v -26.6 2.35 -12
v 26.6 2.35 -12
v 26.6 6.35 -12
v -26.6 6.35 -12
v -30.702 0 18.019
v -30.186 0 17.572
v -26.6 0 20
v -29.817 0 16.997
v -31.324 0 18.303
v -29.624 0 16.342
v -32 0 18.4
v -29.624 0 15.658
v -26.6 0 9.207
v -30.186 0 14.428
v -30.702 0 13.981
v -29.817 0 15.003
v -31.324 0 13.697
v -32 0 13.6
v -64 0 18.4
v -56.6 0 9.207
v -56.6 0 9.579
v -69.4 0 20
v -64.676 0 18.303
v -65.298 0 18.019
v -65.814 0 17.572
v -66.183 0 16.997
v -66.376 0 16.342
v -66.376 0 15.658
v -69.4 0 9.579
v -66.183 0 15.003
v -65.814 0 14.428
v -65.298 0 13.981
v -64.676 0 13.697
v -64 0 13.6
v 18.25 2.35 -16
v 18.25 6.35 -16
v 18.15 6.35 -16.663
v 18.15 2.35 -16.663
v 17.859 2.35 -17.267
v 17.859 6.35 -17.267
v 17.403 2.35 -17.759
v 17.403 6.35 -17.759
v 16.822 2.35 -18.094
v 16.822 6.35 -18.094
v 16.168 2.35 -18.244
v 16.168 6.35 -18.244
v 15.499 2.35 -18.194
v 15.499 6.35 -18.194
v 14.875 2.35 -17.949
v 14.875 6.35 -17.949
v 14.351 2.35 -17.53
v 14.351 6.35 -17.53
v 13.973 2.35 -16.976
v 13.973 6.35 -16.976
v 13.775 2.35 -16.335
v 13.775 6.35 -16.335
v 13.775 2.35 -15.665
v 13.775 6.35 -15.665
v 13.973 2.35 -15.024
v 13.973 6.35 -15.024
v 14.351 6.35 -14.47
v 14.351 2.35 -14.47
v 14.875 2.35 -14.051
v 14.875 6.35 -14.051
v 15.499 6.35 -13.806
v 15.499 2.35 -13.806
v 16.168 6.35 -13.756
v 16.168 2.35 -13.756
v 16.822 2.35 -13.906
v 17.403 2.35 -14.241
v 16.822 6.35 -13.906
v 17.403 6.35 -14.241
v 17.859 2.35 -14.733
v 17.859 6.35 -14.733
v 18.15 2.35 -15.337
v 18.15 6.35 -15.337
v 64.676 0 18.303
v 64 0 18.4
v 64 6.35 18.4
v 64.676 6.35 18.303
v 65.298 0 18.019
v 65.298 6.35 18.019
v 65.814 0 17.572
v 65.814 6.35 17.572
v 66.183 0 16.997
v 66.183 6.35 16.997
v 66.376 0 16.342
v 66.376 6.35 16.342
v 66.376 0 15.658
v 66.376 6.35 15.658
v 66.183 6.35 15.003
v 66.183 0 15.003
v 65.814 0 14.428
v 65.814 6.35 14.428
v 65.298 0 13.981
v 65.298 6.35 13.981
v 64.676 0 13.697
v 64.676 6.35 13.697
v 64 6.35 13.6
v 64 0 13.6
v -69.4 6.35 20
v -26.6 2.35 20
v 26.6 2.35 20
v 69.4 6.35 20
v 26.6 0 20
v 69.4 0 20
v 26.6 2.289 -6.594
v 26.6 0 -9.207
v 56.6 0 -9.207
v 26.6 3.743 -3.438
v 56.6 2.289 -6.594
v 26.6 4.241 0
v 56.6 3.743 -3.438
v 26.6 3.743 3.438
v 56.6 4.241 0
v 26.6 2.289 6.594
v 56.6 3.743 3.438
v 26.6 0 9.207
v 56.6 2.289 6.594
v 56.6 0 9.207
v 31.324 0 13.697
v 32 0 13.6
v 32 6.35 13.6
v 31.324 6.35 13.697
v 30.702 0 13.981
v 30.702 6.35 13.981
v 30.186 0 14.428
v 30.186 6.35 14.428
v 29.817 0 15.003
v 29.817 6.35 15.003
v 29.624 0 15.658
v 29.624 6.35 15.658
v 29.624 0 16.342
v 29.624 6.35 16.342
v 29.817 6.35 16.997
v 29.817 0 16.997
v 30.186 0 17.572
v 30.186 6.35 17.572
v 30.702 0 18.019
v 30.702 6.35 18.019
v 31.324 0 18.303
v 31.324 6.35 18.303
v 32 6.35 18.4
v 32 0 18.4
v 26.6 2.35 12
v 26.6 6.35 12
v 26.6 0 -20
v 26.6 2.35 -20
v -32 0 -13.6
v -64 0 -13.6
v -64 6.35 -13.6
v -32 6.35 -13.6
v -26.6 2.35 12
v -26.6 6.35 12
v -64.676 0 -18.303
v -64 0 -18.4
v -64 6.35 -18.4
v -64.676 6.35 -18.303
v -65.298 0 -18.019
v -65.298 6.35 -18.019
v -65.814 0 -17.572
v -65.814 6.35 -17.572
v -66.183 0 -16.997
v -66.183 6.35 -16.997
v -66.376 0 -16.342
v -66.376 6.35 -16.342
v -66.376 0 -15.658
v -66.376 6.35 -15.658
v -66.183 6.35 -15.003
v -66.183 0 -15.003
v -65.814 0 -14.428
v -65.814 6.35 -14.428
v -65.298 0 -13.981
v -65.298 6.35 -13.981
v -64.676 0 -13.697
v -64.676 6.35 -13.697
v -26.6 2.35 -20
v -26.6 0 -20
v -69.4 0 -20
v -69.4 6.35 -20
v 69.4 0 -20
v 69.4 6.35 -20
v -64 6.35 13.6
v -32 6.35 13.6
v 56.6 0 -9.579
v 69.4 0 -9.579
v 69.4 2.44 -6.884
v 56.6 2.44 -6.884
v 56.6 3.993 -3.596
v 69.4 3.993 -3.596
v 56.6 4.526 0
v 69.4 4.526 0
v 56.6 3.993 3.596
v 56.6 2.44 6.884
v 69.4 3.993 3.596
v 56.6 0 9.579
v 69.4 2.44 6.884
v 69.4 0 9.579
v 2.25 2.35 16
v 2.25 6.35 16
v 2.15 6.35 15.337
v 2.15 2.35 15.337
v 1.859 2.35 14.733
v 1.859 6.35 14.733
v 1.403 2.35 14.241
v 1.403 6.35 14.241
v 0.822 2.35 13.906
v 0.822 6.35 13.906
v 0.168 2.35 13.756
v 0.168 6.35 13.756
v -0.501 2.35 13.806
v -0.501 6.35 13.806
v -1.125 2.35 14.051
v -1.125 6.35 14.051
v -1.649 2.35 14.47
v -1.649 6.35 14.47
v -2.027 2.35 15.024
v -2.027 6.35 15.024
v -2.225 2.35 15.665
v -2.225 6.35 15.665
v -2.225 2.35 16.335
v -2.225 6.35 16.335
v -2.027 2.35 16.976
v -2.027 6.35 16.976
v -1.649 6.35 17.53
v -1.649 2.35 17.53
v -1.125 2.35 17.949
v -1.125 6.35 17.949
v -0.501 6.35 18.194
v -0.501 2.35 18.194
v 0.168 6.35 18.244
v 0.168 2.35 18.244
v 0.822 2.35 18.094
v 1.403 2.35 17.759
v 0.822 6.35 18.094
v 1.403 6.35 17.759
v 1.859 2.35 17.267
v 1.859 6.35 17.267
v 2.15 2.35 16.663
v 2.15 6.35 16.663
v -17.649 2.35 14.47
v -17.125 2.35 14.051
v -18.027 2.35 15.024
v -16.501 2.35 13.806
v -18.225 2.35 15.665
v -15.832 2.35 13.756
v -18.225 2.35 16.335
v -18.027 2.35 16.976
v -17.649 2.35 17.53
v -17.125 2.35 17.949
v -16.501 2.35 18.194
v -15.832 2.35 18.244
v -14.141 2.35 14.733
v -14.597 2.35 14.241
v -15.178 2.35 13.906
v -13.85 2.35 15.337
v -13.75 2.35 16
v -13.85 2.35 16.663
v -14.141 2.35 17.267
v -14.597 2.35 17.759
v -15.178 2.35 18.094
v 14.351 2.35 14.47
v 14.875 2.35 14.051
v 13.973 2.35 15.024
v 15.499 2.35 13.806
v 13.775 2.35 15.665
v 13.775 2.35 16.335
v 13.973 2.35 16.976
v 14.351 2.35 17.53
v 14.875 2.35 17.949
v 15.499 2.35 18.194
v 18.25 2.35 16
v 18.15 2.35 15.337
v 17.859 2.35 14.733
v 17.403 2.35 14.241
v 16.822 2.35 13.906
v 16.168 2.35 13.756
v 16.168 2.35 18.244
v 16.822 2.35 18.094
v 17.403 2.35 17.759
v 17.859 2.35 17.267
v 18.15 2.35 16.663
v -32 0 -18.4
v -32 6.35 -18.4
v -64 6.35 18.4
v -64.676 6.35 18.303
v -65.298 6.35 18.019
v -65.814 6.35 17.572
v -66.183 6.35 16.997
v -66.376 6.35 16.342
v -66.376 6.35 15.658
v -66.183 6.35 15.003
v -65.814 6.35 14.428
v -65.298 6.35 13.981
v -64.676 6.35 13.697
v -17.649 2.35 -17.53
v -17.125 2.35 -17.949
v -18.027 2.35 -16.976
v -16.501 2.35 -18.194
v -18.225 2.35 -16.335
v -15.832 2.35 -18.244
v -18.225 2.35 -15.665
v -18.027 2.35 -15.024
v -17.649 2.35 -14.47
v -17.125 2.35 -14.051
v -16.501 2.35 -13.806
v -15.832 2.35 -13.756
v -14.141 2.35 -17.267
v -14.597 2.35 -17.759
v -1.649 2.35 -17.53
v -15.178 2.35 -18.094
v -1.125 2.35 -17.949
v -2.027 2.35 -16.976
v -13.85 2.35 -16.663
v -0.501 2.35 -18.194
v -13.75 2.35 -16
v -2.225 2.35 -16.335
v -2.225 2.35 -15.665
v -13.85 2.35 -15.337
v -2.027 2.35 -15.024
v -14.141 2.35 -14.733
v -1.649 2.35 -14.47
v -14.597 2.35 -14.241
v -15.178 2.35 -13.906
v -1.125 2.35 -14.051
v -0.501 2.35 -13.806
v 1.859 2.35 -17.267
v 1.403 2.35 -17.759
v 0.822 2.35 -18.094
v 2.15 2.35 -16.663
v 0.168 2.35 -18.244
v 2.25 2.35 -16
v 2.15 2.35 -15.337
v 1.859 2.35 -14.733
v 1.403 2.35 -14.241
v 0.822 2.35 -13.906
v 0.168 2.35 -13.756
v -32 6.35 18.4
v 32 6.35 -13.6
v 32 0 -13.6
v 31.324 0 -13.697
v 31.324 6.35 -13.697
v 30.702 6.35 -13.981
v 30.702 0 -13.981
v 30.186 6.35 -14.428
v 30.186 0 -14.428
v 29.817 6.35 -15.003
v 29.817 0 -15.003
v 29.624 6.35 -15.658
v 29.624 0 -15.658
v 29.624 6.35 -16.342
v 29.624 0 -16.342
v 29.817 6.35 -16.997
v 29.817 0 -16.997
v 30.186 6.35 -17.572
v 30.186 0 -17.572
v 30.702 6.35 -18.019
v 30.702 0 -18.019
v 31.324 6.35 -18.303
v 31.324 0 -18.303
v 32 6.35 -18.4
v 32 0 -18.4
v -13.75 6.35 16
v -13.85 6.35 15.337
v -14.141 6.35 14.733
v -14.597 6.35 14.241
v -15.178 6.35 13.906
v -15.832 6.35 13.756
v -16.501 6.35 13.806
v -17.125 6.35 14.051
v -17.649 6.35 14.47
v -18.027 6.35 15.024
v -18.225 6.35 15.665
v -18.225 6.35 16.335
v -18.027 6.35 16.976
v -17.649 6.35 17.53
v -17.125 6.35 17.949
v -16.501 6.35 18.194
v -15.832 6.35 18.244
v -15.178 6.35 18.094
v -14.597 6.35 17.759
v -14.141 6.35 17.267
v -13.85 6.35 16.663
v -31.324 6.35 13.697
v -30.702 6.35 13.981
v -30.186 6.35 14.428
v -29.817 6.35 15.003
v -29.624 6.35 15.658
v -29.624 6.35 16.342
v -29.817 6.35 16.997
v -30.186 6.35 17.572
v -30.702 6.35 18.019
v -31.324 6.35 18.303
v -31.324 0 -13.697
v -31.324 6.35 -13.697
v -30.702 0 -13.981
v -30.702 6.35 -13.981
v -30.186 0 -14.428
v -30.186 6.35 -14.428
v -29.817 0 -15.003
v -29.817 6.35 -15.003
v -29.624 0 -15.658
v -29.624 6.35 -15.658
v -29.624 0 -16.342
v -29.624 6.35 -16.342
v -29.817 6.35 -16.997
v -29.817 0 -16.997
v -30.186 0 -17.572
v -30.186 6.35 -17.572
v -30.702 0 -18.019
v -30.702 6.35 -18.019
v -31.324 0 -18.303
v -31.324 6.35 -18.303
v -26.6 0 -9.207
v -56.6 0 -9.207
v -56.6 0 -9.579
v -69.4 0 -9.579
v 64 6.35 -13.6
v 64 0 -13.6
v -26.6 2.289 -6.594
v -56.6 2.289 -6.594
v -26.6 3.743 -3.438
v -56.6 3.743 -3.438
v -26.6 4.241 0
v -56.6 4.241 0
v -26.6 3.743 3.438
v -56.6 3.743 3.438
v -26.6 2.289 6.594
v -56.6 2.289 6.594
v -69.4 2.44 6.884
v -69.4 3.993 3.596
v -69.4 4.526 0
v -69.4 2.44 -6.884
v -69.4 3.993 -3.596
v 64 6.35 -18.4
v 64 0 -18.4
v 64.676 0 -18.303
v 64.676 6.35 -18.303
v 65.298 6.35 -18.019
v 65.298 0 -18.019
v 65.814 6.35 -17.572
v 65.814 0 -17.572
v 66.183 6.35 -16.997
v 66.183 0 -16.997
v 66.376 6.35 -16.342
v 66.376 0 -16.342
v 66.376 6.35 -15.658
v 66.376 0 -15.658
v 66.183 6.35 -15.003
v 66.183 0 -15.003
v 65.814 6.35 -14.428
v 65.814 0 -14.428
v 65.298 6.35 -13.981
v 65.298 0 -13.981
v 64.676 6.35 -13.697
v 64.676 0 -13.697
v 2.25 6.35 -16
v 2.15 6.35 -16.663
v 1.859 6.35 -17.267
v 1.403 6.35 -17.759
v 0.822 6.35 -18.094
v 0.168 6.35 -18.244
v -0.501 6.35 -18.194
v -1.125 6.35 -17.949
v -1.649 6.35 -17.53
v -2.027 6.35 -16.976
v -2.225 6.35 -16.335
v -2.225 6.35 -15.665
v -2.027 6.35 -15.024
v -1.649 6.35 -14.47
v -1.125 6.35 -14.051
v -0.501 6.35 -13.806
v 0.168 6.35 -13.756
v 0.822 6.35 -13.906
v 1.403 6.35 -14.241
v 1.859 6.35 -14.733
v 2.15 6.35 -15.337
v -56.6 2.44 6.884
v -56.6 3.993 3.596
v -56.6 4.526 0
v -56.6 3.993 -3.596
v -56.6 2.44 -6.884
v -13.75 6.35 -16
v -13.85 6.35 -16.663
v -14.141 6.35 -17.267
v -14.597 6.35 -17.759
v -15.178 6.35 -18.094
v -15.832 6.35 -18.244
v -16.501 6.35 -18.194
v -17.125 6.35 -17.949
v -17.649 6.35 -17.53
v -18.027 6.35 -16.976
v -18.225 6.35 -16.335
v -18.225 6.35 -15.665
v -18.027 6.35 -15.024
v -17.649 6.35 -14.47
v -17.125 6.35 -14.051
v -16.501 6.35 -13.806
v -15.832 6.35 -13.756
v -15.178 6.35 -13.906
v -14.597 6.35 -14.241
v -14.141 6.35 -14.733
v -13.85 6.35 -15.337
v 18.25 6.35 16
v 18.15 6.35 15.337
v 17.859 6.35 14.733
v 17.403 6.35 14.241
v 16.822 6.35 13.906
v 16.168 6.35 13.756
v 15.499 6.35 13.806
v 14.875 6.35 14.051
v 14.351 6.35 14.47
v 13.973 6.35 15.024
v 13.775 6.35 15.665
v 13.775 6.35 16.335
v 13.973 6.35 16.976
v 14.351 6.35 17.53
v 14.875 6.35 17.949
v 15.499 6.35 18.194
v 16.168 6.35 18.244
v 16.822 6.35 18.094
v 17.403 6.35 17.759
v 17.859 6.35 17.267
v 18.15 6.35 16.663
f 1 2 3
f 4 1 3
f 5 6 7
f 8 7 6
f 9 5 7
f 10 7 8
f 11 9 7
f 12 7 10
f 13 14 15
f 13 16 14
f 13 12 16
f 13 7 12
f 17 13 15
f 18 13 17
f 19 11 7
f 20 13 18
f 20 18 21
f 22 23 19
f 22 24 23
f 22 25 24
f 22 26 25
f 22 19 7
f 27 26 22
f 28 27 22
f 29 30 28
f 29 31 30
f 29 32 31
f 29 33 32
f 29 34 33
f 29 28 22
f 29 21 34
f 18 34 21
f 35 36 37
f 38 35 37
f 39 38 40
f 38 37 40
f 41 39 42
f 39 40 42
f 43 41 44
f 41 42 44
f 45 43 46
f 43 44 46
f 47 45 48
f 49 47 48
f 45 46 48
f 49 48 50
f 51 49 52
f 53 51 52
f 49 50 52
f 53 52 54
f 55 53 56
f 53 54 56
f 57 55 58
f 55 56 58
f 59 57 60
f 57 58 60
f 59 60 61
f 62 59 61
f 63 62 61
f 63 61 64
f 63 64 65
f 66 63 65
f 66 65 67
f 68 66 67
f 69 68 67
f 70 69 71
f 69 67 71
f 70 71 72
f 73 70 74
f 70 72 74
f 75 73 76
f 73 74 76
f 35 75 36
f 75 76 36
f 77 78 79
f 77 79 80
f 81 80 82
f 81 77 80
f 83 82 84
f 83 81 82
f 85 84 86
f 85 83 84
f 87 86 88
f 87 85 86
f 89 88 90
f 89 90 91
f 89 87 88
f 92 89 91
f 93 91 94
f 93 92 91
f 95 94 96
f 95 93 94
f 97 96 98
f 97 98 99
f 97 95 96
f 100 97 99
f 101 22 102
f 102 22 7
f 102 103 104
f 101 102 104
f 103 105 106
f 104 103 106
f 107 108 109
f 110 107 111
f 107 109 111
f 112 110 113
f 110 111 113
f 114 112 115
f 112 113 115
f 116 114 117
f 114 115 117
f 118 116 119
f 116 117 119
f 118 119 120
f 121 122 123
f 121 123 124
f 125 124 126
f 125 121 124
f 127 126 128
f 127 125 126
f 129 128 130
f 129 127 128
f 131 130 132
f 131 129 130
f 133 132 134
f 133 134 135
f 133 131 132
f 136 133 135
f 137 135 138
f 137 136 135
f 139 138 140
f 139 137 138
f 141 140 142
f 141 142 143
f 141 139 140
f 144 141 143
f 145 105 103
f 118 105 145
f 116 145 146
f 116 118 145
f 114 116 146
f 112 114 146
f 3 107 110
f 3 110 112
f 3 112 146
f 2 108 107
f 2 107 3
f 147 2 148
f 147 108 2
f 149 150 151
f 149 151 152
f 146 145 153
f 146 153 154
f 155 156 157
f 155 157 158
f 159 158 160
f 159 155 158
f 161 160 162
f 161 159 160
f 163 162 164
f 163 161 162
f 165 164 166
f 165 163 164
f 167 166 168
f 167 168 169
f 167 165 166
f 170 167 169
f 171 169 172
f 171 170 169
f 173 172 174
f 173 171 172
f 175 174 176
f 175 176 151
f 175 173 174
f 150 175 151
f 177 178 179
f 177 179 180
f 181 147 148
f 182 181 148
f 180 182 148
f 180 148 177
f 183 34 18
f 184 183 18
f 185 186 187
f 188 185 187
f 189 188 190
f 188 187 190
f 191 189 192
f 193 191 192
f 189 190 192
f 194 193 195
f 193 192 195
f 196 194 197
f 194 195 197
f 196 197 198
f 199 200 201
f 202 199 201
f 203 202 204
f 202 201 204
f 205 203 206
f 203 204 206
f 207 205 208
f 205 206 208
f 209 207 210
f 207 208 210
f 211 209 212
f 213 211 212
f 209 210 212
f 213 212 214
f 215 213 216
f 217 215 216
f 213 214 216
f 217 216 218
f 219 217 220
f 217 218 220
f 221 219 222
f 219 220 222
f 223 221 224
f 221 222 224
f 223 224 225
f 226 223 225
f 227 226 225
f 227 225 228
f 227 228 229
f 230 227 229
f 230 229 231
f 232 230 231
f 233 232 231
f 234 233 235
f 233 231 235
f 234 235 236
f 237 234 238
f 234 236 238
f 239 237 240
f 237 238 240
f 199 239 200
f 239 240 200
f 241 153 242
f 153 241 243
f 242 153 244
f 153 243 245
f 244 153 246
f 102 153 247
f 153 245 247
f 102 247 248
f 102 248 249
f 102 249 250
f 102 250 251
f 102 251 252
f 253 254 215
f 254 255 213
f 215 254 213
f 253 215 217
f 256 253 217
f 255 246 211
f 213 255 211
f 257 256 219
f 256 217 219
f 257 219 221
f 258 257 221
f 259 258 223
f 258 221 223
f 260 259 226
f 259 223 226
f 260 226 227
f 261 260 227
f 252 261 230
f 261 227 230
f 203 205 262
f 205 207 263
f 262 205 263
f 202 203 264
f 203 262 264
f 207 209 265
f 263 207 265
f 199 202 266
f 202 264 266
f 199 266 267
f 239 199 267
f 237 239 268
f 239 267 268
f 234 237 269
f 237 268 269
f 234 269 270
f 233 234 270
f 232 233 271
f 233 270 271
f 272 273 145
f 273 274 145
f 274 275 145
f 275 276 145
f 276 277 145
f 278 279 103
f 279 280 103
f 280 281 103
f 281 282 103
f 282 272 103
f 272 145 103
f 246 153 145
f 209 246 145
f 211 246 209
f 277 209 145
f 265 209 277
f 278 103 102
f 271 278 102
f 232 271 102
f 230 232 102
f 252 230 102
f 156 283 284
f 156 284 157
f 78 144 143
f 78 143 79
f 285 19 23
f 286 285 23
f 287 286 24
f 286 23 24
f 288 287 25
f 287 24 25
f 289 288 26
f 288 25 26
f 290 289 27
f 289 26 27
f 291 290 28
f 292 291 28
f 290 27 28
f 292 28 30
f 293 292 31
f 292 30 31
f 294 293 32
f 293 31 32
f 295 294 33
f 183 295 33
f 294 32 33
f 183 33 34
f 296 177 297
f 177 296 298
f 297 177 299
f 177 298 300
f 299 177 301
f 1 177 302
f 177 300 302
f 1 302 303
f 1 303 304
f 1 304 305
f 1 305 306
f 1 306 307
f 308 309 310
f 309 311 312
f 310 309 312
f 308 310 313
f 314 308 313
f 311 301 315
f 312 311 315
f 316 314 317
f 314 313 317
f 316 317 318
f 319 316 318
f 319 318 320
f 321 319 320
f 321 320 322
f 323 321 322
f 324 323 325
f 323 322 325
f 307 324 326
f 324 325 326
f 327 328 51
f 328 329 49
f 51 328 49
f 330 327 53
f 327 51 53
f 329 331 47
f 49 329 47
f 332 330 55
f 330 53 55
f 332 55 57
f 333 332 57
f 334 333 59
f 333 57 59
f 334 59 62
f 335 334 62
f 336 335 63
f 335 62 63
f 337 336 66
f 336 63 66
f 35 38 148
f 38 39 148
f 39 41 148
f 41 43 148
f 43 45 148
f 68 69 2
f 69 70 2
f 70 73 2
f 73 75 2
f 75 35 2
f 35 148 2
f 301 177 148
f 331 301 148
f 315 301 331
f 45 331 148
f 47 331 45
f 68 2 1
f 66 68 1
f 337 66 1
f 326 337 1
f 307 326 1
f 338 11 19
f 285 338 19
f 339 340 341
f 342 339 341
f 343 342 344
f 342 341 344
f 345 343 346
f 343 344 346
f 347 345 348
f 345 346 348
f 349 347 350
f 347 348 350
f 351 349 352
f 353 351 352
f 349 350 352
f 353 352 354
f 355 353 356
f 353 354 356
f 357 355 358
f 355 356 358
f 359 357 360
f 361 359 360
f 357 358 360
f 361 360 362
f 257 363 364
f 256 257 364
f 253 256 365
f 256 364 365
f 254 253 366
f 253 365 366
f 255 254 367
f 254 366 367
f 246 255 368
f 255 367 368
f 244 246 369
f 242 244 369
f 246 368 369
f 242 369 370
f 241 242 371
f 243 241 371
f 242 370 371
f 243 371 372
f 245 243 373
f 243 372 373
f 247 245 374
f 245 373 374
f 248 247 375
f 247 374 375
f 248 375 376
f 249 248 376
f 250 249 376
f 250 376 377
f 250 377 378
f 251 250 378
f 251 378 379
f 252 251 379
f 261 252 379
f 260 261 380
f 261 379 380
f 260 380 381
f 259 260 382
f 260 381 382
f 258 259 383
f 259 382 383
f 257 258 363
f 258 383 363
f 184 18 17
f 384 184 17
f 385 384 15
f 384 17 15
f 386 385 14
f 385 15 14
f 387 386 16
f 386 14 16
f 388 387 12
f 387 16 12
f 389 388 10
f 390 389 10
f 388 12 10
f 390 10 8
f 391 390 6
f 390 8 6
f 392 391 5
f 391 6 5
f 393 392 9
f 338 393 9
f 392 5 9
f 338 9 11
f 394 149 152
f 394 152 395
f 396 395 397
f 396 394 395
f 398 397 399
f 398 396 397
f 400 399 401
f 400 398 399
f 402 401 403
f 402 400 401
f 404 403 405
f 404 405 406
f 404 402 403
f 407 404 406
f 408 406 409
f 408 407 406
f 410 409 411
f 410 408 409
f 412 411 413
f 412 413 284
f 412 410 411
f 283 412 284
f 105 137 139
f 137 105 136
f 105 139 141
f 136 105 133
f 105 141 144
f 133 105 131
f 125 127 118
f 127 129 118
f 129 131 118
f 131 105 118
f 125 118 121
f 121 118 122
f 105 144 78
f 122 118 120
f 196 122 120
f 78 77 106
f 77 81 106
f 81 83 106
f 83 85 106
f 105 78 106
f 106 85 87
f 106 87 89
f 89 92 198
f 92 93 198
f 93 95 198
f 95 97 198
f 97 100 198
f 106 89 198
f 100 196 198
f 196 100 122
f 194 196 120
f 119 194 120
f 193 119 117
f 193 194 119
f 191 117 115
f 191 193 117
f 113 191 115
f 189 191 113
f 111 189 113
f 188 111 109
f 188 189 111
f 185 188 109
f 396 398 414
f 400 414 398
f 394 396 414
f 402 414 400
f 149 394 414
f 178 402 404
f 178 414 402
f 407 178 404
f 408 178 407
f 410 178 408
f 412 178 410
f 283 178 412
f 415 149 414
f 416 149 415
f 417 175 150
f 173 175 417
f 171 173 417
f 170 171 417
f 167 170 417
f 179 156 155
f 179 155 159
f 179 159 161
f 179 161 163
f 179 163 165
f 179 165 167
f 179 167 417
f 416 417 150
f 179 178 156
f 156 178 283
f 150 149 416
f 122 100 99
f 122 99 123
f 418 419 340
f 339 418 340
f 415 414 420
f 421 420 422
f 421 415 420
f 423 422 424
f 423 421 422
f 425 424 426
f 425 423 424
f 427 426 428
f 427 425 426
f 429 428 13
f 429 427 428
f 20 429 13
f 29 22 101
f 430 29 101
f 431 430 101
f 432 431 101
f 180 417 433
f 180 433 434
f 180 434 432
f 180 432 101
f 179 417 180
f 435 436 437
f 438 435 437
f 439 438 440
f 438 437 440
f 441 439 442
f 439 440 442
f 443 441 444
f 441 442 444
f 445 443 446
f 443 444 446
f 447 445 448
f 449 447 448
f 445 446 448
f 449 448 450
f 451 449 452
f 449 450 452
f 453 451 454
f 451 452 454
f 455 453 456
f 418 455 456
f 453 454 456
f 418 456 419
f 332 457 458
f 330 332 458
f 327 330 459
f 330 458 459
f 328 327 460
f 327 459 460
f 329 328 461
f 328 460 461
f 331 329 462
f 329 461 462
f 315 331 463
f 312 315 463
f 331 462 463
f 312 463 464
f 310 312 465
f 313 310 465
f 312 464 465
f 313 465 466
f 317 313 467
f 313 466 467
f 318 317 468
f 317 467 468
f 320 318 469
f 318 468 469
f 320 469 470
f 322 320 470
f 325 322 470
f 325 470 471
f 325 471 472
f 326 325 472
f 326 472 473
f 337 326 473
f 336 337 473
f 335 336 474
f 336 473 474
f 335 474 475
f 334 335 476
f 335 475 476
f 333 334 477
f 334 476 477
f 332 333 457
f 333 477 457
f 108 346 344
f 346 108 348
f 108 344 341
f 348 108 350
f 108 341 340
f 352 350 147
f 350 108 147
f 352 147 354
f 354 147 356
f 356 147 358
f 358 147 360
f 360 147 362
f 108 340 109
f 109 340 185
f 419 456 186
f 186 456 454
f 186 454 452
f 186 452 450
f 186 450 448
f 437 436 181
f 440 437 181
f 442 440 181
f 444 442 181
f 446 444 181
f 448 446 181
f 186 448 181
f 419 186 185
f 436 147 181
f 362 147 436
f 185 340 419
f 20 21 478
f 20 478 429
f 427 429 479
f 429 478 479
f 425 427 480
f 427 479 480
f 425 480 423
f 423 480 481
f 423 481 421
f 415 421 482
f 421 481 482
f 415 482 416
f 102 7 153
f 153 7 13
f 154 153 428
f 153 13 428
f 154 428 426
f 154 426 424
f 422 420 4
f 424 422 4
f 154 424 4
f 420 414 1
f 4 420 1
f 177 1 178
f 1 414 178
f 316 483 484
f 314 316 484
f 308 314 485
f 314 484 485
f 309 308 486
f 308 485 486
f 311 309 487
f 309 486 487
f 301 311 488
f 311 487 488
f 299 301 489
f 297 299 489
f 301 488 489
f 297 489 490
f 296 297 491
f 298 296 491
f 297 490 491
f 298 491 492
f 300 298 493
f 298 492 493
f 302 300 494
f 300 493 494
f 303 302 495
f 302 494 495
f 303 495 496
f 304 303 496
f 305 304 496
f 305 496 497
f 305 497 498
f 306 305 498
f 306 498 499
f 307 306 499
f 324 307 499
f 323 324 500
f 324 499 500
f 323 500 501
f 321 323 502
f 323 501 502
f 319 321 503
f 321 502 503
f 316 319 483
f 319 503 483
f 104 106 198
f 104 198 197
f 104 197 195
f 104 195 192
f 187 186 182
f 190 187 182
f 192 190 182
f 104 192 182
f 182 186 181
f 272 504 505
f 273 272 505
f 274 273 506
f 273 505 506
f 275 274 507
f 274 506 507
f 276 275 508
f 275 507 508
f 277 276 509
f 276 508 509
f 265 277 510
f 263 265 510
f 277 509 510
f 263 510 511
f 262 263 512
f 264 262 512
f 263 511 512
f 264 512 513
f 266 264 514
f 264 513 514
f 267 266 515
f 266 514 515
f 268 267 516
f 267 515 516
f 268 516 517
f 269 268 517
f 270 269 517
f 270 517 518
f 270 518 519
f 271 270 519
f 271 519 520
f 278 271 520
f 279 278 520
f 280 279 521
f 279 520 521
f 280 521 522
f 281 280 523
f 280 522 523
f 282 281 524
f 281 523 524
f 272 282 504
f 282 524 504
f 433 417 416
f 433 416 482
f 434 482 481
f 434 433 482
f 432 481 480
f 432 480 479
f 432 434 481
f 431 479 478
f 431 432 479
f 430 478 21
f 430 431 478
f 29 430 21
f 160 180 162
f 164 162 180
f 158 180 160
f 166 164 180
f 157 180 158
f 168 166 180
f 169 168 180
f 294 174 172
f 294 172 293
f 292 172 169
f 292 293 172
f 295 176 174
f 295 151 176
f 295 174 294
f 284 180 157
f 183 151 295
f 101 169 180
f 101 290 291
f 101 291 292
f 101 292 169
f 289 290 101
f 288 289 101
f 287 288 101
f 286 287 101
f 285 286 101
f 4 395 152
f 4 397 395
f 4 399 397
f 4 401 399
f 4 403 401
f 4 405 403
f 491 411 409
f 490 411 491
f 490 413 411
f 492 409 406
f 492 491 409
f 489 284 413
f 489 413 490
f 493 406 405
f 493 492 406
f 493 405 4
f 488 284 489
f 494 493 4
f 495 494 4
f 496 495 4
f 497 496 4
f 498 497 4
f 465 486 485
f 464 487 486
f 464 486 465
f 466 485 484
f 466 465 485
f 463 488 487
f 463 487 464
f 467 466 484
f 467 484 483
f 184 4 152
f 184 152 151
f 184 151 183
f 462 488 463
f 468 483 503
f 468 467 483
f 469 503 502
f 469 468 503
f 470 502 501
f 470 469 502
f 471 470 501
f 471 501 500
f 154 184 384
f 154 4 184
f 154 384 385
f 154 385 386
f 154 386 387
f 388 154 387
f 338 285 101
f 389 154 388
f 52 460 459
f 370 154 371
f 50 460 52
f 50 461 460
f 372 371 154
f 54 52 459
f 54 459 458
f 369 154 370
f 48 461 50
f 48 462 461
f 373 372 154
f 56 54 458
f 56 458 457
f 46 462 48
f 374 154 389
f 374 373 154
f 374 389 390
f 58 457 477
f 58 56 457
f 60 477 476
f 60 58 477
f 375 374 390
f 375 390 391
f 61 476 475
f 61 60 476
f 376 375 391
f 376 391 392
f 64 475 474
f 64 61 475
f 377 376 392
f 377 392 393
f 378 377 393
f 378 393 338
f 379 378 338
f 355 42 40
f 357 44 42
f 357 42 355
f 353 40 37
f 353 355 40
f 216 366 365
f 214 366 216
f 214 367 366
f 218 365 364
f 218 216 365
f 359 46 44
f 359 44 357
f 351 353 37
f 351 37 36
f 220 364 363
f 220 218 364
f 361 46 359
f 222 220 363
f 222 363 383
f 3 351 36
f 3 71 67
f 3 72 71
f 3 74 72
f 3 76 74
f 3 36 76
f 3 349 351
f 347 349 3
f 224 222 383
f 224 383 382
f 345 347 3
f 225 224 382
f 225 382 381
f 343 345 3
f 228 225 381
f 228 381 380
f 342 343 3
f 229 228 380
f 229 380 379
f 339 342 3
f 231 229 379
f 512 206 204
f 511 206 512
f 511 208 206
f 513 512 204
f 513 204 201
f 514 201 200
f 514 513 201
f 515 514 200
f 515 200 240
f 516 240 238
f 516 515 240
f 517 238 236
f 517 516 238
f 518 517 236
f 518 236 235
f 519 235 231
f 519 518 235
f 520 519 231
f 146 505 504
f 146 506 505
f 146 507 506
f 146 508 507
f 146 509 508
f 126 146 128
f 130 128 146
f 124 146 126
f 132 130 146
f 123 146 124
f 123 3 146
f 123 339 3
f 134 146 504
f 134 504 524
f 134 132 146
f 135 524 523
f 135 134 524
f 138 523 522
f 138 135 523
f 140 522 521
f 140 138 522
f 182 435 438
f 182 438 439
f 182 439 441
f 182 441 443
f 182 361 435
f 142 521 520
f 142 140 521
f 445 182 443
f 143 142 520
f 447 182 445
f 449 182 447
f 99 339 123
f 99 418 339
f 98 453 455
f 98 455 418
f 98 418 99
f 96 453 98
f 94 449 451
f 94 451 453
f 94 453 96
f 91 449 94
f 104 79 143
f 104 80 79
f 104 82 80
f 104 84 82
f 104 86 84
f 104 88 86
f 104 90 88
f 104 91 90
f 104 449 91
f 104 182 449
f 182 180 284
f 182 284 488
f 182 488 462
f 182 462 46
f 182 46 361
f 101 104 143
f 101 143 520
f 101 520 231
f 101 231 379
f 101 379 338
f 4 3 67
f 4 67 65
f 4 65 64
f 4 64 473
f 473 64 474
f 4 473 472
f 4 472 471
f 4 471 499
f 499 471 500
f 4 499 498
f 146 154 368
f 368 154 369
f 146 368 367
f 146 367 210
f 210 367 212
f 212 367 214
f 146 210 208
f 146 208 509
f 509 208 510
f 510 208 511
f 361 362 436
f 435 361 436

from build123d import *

# Parameters (mm, degrees)
SKETCH3_W            = 42.8
SKETCH3_H            = 40
BOSS_EXTRUDE1_DEPTH  = 6.35
SKETCH4_R            = 12.4
CUT_EXTRUDE1_DEPTH   = 12.8
SKETCH5_R            = 12.115
CUT_EXTRUDE2_DEPTH   = 31
SKETCH6_W            = 8
SKETCH6_H            = 4
BOSS_EXTRUDE2_DEPTH  = 53.2
SKETCH7_R            = 2.25
CUT_EXTRUDE3_DEPTH   = 4
LPATTERN1_COUNT      = 3
LPATTERN1_PITCH      = 16
LPATTERN1_COUNT_DIR2 = 2
LPATTERN1_PITCH_DIR2 = 32


with BuildPart() as part:
    # Sketch3 → Boss-Extrude1 (new body)
    with BuildSketch(Plane(origin=(0, 0, 0), x_dir=(1, 0, 0), z_dir=(0, 1, 0))):
        with Locations((48, 0)):
            Rectangle(SKETCH3_W, SKETCH3_H)
        with BuildLine():
            Line((32, 18.4), (64, 18.4))
            ThreePointArc((64, 18.4), (66.4, 16), (64, 13.6))
            Line((64, 13.6), (32, 13.6))
            ThreePointArc((32, 13.6), (29.6, 16), (32, 18.4))
        make_face(mode=Mode.SUBTRACT)
        with BuildLine():
            Line((32, -18.4), (64, -18.4))
            ThreePointArc((64, -18.4), (66.4, -16), (64, -13.6))
            Line((64, -13.6), (32, -13.6))
            ThreePointArc((32, -13.6), (29.6, -16), (32, -18.4))
        make_face(mode=Mode.SUBTRACT)
    extrude(amount=BOSS_EXTRUDE1_DEPTH)

    # Sketch4 → Cut-Extrude1 (cut)
    with BuildSketch(Plane(origin=(69.4, 0, 0), x_dir=(0, 0, -1), z_dir=(1, 0, 0))):
        with Locations((0, -7.874)):
            Circle(SKETCH4_R)
    extrude(amount=-CUT_EXTRUDE1_DEPTH, mode=Mode.SUBTRACT)

    # Sketch5 → Cut-Extrude2 (cut, through all)
    with BuildSketch(Plane(origin=(56.6, 0, 0), x_dir=(0, 0, -1), z_dir=(1, 0, 0))):
        with Locations((0, -7.874)):
            Circle(SKETCH5_R)
    extrude(amount=-CUT_EXTRUDE2_DEPTH, mode=Mode.SUBTRACT)


with BuildPart() as body_2:
    # Mirror2: mirrored copy
    add(part.part.mirror(Plane(origin=(0, 0, 0), x_dir=(0, 0, 1), z_dir=(1, 0, 0))))


with BuildPart() as part_1:
    add(part.part)

    add(body_2.part)  # Boss-Extrude2 merges body 2
    # Sketch6 → Boss-Extrude2 (add)
    with BuildSketch(Plane.ZY.offset(-26.6)):
        with Locations((-16, 4.35)):
            Rectangle(SKETCH6_W, SKETCH6_H)
        with Locations((16, 4.35)):
            Rectangle(SKETCH6_W, SKETCH6_H)
    extrude(amount=BOSS_EXTRUDE2_DEPTH)

    # Sketch7 → Cut-Extrude3 (cut)
    with BuildSketch(Plane(origin=(0, 6.35, 0), x_dir=(1, 0, 0), z_dir=(0, 1, 0))):
        with Locations((-16, 16)):
            Circle(SKETCH7_R)
    cut_extrude3 = extrude(amount=-CUT_EXTRUDE3_DEPTH, mode=Mode.SUBTRACT)

    # LPattern1: Cut-Extrude3 3 × 2
    with Locations(*[(i * LPATTERN1_PITCH, 0, j * LPATTERN1_PITCH_DIR2) for i in range(LPATTERN1_COUNT) for j in range(LPATTERN1_COUNT_DIR2) if (i, j) != (0, 0)]):
        add(cut_extrude3, mode=Mode.SUBTRACT)


solid = part_1.part
